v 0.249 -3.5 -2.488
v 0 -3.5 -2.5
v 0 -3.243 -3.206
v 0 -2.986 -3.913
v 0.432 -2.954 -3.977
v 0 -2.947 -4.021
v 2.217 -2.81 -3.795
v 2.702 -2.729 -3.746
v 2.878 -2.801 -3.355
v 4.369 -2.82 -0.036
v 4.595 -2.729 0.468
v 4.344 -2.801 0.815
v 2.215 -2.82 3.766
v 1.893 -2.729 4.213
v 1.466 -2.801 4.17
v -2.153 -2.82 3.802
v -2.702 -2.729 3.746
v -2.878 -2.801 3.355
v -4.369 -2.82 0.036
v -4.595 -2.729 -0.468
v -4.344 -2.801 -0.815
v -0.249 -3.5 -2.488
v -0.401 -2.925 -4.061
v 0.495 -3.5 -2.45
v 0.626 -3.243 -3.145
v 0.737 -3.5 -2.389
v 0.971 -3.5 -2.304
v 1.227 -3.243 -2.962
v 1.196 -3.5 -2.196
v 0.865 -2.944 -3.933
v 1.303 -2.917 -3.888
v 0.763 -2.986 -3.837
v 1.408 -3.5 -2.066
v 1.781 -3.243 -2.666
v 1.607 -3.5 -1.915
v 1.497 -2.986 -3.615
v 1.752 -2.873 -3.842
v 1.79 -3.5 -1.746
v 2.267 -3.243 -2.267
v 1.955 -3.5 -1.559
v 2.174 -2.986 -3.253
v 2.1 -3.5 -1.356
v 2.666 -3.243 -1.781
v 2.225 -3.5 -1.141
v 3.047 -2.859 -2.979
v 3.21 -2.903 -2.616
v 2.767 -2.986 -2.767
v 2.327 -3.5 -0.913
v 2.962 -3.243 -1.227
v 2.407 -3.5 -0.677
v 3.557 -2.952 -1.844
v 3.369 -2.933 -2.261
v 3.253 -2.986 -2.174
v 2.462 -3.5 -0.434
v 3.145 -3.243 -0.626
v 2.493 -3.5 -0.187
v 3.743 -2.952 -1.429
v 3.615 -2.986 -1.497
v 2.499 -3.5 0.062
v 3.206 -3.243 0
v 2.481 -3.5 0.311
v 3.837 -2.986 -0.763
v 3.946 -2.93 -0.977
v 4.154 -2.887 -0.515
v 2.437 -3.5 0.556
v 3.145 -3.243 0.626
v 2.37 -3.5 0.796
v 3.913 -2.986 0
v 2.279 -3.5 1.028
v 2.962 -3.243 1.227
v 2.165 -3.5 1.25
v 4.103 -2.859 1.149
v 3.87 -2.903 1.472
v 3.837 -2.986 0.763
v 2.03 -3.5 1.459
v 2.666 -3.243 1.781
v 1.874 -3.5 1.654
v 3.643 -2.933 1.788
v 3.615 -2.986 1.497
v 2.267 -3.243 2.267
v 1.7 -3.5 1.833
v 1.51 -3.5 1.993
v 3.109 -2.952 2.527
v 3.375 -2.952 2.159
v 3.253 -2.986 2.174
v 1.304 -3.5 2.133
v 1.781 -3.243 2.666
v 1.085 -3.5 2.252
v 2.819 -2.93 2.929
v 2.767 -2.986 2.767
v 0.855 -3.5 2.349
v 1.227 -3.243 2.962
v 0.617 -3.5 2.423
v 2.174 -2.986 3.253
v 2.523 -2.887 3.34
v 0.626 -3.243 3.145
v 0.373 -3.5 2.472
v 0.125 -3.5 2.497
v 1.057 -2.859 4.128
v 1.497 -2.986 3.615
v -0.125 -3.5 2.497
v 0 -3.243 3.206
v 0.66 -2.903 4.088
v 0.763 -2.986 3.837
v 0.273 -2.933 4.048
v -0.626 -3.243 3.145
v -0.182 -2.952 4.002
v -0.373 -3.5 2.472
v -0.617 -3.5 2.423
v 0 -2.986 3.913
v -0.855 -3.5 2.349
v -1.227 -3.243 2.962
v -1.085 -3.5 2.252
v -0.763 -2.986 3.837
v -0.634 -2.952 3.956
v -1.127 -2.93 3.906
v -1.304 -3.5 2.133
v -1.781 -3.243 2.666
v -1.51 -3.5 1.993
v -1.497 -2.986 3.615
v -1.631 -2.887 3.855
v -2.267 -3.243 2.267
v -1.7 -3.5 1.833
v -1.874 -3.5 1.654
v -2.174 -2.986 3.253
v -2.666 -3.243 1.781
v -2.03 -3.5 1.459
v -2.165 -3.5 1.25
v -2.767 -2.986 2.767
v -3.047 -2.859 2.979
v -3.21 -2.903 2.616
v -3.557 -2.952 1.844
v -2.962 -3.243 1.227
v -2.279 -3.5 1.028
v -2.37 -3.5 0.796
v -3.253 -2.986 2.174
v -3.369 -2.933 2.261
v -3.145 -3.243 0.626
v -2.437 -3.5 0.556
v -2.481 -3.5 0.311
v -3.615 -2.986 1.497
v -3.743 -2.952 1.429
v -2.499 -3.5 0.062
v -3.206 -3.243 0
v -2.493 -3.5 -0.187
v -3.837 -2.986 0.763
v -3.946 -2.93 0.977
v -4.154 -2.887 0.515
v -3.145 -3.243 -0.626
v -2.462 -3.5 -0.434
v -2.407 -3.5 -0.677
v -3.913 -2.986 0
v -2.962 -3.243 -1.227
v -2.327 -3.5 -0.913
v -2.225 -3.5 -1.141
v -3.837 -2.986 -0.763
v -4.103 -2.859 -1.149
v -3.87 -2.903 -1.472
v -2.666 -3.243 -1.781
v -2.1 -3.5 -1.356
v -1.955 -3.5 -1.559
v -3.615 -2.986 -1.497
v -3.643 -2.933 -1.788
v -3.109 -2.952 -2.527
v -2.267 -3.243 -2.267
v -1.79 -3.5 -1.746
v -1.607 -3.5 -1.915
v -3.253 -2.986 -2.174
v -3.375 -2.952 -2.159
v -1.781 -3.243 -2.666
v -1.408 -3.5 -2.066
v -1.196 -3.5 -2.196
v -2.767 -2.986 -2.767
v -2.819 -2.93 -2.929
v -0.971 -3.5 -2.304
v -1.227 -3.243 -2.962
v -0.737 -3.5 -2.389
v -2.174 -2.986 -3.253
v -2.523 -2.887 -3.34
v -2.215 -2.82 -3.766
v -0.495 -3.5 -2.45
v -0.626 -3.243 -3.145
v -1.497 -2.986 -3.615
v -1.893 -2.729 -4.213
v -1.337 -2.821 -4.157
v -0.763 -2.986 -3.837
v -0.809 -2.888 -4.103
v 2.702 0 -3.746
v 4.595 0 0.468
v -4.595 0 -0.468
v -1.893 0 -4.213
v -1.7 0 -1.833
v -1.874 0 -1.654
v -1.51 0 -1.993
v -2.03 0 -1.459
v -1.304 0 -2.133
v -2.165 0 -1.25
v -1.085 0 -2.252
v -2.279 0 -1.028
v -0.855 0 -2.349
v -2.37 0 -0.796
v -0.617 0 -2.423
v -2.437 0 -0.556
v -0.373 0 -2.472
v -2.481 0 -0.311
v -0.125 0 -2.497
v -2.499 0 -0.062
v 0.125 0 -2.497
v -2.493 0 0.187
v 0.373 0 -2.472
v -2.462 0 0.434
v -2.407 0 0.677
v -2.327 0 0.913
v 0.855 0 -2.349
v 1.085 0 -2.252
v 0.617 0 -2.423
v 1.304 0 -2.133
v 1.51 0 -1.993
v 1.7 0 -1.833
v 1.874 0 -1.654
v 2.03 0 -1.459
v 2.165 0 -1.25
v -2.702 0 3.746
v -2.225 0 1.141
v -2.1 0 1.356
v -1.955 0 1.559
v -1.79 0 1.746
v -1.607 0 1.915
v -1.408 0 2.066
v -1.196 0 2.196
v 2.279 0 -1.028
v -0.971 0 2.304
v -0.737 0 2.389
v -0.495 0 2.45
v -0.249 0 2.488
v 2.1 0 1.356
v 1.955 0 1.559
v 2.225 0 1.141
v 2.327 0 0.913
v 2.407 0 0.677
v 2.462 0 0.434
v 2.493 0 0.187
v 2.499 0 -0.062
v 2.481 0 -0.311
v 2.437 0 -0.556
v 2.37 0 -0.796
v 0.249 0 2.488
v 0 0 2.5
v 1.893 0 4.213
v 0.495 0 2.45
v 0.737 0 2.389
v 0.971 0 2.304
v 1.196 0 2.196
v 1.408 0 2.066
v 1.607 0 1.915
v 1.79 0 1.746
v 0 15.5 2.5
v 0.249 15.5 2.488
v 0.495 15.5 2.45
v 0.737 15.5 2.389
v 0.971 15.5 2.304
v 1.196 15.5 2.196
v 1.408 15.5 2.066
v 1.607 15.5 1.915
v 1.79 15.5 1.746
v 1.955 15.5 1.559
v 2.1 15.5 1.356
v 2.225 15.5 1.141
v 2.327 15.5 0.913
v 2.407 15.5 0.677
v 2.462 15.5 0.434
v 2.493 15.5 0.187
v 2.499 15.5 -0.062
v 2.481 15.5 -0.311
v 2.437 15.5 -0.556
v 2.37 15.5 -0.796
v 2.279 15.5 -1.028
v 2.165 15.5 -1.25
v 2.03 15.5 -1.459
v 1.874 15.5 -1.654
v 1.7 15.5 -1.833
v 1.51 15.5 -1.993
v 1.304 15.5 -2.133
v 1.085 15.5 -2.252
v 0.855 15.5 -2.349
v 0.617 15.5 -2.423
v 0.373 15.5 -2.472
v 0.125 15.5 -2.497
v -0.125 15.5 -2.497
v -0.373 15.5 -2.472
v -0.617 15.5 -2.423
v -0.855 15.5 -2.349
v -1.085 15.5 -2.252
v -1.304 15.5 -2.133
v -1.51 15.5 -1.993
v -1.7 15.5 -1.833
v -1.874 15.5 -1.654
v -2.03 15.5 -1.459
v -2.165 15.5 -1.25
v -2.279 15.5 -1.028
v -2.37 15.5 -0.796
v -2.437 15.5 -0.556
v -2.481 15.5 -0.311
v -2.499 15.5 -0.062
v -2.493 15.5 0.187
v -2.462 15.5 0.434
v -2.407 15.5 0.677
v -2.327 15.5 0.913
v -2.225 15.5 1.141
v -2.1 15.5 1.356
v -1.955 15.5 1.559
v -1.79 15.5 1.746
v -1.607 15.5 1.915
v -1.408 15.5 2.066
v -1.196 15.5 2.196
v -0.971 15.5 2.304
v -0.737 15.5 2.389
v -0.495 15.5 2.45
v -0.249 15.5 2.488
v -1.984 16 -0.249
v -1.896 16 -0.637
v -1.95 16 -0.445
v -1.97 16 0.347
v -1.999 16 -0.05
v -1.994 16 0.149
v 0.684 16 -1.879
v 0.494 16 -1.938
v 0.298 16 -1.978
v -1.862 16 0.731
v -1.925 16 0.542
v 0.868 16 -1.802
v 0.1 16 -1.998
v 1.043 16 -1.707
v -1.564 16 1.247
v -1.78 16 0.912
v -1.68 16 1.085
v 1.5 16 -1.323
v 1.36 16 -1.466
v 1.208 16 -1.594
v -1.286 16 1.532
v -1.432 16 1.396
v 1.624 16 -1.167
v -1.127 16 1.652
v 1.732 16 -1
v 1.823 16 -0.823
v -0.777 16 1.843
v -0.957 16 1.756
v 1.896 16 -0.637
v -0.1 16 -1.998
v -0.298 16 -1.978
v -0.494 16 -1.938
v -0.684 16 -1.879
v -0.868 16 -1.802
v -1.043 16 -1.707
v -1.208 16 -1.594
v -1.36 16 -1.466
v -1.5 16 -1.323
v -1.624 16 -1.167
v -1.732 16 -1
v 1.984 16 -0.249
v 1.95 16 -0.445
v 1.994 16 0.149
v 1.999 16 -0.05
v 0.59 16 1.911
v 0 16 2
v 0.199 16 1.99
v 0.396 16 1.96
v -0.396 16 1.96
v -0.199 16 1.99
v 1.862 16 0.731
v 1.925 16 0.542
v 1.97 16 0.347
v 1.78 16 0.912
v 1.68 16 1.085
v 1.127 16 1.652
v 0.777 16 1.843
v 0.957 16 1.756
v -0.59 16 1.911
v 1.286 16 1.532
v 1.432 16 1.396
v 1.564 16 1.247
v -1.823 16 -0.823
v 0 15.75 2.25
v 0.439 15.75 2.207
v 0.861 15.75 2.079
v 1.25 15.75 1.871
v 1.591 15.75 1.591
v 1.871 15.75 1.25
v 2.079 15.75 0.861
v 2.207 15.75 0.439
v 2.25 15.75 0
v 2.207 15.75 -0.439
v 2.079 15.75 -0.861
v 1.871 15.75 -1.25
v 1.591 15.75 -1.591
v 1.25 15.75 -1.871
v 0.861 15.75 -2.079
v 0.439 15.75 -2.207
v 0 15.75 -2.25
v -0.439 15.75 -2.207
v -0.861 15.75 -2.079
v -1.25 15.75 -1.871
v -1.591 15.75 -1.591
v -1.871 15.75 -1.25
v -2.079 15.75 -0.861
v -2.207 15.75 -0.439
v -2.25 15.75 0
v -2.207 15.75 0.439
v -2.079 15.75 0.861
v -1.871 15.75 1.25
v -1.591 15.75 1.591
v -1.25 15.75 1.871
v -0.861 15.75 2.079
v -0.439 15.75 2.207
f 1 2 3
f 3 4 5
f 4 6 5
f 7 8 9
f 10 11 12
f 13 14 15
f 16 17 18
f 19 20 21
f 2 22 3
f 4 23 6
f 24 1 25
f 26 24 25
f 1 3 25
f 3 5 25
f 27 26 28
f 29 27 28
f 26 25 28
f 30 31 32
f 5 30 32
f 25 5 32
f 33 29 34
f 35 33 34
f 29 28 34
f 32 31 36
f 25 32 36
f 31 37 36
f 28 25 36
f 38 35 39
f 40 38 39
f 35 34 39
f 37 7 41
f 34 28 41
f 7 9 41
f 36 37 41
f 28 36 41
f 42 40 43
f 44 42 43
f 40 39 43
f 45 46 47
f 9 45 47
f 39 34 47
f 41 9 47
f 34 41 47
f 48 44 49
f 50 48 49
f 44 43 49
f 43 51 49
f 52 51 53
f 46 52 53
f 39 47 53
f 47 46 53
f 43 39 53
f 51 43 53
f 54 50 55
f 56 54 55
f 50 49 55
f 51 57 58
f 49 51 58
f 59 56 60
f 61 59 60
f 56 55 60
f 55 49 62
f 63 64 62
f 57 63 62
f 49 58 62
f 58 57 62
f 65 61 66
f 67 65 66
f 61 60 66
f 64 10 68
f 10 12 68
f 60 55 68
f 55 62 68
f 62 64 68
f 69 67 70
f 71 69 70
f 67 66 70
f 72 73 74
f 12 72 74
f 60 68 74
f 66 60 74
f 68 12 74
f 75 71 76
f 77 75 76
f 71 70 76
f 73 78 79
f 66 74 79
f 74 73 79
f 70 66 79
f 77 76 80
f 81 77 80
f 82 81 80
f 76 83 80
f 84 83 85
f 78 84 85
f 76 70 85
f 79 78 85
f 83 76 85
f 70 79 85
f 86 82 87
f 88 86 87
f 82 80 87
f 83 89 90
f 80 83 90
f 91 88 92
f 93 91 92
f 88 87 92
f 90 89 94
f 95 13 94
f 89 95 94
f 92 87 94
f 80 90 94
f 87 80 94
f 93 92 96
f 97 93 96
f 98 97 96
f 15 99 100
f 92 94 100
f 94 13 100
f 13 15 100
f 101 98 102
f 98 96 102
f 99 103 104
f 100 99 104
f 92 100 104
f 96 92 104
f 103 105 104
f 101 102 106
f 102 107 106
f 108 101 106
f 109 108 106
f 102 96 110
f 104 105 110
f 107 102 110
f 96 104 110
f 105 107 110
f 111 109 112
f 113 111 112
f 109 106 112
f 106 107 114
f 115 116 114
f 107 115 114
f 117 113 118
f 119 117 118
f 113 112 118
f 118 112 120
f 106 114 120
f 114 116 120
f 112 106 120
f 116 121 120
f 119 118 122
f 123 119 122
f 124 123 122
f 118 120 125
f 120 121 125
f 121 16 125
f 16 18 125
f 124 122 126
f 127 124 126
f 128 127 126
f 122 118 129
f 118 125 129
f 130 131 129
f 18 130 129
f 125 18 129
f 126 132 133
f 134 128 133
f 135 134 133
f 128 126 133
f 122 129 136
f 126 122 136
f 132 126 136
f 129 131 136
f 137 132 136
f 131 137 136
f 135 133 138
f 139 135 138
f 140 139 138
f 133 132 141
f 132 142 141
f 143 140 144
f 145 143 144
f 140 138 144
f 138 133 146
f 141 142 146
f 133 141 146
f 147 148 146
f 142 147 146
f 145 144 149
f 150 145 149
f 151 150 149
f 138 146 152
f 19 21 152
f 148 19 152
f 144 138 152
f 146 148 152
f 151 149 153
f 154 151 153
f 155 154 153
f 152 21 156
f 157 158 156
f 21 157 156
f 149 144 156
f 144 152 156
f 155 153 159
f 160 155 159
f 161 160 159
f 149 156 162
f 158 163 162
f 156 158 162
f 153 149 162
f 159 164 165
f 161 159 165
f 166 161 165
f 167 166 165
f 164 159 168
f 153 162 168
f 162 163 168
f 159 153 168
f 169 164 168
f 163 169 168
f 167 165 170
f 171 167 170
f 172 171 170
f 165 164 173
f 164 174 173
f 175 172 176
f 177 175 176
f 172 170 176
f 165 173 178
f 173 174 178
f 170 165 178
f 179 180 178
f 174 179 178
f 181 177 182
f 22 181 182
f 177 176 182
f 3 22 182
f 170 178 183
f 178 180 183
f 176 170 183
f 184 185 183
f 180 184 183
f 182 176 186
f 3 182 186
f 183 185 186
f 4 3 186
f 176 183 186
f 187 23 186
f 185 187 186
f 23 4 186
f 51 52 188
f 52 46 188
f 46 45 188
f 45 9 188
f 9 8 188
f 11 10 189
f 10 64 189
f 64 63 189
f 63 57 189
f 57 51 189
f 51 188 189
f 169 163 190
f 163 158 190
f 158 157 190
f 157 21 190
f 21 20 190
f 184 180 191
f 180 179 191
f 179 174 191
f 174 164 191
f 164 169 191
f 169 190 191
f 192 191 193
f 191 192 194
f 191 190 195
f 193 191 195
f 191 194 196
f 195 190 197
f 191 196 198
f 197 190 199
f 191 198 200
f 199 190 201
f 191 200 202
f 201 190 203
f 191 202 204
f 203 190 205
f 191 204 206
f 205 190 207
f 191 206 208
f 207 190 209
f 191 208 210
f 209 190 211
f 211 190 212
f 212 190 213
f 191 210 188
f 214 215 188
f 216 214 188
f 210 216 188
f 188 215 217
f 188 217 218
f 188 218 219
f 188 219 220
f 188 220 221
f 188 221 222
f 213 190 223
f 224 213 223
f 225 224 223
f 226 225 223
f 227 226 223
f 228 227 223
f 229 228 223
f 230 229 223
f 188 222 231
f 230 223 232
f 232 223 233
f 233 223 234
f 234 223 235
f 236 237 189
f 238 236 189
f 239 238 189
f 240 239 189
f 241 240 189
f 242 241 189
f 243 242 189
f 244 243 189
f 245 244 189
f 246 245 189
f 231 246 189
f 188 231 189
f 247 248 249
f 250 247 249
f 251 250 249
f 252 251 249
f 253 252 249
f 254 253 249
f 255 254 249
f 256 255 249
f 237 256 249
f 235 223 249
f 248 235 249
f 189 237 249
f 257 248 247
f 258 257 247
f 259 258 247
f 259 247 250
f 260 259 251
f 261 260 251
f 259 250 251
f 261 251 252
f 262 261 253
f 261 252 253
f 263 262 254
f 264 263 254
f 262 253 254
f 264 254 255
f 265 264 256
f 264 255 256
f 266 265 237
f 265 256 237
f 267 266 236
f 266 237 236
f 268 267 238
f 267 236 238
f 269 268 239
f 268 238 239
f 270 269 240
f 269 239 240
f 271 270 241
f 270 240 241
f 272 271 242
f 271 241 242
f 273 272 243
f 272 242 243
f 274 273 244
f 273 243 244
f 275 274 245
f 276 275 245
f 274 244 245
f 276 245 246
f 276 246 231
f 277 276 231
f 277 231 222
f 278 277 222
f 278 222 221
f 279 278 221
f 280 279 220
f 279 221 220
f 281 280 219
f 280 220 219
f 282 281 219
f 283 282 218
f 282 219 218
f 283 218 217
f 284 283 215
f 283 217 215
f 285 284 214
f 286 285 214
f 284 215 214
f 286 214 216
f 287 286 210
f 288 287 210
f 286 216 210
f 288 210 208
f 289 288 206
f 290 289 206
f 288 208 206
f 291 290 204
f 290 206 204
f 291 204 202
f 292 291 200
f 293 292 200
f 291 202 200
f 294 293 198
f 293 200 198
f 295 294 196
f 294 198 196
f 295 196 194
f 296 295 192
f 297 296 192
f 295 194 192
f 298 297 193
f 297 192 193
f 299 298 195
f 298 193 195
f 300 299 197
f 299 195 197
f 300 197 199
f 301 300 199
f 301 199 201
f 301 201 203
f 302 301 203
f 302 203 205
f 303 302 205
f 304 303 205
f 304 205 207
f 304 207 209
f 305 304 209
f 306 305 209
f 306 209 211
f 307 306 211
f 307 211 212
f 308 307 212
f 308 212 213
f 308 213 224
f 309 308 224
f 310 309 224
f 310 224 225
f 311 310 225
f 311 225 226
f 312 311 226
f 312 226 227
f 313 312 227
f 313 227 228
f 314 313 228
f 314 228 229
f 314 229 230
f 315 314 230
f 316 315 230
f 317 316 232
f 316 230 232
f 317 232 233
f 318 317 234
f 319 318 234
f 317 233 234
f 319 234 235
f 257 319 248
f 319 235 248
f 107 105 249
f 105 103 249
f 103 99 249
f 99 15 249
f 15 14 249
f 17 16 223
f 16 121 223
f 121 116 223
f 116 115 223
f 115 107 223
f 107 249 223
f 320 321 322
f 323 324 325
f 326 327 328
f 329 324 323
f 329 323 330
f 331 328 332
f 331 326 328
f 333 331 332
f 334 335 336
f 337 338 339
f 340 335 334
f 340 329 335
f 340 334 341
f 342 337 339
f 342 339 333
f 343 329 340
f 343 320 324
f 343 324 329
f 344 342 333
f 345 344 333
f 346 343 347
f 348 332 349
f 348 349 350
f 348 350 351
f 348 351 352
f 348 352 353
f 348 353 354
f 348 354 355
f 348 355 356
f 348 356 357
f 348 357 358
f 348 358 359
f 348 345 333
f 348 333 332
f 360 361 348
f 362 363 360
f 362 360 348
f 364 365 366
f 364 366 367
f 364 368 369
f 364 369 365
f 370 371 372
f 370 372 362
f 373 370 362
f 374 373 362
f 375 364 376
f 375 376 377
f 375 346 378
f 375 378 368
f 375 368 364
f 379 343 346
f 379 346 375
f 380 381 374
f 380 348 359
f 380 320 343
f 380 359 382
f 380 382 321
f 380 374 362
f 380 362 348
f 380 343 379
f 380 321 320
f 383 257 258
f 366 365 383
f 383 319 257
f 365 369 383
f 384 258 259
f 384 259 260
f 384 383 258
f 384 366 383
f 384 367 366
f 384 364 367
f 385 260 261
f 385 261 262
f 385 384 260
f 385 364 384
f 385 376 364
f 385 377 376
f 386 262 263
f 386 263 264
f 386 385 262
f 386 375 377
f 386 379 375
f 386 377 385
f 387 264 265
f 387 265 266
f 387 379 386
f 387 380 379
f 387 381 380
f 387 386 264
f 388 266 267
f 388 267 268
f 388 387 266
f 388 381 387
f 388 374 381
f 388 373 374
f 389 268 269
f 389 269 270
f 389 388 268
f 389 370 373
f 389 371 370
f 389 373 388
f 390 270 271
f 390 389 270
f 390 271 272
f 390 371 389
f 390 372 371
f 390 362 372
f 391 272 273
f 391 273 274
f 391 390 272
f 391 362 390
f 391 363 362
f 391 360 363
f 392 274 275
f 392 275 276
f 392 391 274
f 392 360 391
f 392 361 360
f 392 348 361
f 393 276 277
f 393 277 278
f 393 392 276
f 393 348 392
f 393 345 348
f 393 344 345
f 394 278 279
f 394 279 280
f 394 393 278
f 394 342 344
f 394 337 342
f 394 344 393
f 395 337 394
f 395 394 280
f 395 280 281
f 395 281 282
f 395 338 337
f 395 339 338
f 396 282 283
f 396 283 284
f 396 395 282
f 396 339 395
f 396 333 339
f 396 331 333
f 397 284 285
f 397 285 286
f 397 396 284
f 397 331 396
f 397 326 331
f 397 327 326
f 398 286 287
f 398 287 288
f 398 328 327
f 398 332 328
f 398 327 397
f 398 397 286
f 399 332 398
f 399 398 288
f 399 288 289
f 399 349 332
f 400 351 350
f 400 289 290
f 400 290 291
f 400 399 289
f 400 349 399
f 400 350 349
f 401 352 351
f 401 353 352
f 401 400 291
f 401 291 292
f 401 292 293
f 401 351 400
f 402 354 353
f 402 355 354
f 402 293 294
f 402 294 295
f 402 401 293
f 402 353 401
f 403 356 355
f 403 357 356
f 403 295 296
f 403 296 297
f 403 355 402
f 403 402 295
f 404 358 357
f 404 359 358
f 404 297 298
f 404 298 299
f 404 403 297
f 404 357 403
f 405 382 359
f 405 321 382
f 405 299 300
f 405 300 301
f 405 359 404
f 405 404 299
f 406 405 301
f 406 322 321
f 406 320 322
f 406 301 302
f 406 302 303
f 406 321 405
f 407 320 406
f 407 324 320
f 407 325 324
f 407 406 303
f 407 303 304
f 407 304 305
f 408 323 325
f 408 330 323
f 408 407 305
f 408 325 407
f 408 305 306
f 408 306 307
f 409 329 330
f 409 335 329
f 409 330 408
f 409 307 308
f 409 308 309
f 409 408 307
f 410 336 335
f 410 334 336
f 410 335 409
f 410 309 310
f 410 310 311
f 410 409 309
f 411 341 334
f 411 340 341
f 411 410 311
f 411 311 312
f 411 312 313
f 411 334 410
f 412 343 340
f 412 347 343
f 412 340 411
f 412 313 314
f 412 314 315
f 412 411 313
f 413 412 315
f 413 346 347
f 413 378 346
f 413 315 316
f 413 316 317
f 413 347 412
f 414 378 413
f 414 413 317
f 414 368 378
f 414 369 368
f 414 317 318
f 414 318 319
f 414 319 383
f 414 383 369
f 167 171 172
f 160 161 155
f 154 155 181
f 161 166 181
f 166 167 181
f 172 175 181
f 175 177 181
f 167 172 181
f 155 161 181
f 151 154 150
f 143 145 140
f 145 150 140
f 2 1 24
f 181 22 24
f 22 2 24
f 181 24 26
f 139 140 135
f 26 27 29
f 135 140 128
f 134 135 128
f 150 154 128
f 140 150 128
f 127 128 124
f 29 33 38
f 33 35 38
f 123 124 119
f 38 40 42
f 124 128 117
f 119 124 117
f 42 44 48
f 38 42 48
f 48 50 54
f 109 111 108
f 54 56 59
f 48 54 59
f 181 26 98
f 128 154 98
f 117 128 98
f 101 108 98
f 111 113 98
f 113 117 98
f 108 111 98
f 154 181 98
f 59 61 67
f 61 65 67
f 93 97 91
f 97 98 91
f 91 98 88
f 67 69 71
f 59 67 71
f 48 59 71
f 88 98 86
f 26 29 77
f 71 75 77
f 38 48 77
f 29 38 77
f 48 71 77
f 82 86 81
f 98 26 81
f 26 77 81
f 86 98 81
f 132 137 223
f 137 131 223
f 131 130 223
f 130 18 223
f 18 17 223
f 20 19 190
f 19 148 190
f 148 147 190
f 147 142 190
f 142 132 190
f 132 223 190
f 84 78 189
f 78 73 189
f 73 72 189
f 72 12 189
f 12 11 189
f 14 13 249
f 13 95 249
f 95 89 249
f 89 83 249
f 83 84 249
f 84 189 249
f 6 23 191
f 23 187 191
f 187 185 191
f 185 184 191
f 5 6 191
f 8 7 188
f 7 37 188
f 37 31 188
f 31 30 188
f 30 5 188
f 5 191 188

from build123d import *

# Parameters (mm, degrees)
SKETCH1_R           = 2.5
BOSS_EXTRUDE1_DEPTH = 16
CHAMFER1_SIZE       = 0.5
BOSS_EXTRUDE2_DEPTH = 3.5


with BuildPart() as part:
    # Sketch1 → Boss-Extrude1 (new body)
    with BuildSketch(Plane(origin=(0, 0, 0), x_dir=(1, 0, 0), z_dir=(0, 1, 0))):
        with Locations(Location((0, 0, 0), (0, 0, 270))):
            Circle(SKETCH1_R)
    extrude(amount=BOSS_EXTRUDE1_DEPTH)

    # Chamfer1
    chamfer1_edges = [part.edges().sort_by_distance(p)[0] for p in [
        (0, 16, -2.5),
    ]]
    chamfer(chamfer1_edges, length=CHAMFER1_SIZE)

    # Sketch2 → Boss-Extrude2 (add)
    with BuildSketch(Plane.XZ):
        Polygon((4.595076966, 0.467547866), (1.892630154, 4.213227318), (-2.702446812, 3.745679452), (-4.595076966, -0.467547866), (-1.892630154, -4.213227318), (2.702446812, -3.745679452), align=None)
    extrude(amount=BOSS_EXTRUDE2_DEPTH)

    # Sketch4 → Cut-Revolve1 (revolve, cut)
    with BuildSketch(Plane(origin=(0, 0, 0), x_dir=(0, 0, -1), z_dir=(1, 0, 0))):
        Polygon((0, -3.5), (2.5, -3.5), (6.193754438, -2.155583332), (6.193754438, -4.64679672), (0, -4.64679672), align=None)
    revolve(axis=Axis((0, 0, 0), (0, -1, 0)), mode=Mode.SUBTRACT)


solid = part.part
